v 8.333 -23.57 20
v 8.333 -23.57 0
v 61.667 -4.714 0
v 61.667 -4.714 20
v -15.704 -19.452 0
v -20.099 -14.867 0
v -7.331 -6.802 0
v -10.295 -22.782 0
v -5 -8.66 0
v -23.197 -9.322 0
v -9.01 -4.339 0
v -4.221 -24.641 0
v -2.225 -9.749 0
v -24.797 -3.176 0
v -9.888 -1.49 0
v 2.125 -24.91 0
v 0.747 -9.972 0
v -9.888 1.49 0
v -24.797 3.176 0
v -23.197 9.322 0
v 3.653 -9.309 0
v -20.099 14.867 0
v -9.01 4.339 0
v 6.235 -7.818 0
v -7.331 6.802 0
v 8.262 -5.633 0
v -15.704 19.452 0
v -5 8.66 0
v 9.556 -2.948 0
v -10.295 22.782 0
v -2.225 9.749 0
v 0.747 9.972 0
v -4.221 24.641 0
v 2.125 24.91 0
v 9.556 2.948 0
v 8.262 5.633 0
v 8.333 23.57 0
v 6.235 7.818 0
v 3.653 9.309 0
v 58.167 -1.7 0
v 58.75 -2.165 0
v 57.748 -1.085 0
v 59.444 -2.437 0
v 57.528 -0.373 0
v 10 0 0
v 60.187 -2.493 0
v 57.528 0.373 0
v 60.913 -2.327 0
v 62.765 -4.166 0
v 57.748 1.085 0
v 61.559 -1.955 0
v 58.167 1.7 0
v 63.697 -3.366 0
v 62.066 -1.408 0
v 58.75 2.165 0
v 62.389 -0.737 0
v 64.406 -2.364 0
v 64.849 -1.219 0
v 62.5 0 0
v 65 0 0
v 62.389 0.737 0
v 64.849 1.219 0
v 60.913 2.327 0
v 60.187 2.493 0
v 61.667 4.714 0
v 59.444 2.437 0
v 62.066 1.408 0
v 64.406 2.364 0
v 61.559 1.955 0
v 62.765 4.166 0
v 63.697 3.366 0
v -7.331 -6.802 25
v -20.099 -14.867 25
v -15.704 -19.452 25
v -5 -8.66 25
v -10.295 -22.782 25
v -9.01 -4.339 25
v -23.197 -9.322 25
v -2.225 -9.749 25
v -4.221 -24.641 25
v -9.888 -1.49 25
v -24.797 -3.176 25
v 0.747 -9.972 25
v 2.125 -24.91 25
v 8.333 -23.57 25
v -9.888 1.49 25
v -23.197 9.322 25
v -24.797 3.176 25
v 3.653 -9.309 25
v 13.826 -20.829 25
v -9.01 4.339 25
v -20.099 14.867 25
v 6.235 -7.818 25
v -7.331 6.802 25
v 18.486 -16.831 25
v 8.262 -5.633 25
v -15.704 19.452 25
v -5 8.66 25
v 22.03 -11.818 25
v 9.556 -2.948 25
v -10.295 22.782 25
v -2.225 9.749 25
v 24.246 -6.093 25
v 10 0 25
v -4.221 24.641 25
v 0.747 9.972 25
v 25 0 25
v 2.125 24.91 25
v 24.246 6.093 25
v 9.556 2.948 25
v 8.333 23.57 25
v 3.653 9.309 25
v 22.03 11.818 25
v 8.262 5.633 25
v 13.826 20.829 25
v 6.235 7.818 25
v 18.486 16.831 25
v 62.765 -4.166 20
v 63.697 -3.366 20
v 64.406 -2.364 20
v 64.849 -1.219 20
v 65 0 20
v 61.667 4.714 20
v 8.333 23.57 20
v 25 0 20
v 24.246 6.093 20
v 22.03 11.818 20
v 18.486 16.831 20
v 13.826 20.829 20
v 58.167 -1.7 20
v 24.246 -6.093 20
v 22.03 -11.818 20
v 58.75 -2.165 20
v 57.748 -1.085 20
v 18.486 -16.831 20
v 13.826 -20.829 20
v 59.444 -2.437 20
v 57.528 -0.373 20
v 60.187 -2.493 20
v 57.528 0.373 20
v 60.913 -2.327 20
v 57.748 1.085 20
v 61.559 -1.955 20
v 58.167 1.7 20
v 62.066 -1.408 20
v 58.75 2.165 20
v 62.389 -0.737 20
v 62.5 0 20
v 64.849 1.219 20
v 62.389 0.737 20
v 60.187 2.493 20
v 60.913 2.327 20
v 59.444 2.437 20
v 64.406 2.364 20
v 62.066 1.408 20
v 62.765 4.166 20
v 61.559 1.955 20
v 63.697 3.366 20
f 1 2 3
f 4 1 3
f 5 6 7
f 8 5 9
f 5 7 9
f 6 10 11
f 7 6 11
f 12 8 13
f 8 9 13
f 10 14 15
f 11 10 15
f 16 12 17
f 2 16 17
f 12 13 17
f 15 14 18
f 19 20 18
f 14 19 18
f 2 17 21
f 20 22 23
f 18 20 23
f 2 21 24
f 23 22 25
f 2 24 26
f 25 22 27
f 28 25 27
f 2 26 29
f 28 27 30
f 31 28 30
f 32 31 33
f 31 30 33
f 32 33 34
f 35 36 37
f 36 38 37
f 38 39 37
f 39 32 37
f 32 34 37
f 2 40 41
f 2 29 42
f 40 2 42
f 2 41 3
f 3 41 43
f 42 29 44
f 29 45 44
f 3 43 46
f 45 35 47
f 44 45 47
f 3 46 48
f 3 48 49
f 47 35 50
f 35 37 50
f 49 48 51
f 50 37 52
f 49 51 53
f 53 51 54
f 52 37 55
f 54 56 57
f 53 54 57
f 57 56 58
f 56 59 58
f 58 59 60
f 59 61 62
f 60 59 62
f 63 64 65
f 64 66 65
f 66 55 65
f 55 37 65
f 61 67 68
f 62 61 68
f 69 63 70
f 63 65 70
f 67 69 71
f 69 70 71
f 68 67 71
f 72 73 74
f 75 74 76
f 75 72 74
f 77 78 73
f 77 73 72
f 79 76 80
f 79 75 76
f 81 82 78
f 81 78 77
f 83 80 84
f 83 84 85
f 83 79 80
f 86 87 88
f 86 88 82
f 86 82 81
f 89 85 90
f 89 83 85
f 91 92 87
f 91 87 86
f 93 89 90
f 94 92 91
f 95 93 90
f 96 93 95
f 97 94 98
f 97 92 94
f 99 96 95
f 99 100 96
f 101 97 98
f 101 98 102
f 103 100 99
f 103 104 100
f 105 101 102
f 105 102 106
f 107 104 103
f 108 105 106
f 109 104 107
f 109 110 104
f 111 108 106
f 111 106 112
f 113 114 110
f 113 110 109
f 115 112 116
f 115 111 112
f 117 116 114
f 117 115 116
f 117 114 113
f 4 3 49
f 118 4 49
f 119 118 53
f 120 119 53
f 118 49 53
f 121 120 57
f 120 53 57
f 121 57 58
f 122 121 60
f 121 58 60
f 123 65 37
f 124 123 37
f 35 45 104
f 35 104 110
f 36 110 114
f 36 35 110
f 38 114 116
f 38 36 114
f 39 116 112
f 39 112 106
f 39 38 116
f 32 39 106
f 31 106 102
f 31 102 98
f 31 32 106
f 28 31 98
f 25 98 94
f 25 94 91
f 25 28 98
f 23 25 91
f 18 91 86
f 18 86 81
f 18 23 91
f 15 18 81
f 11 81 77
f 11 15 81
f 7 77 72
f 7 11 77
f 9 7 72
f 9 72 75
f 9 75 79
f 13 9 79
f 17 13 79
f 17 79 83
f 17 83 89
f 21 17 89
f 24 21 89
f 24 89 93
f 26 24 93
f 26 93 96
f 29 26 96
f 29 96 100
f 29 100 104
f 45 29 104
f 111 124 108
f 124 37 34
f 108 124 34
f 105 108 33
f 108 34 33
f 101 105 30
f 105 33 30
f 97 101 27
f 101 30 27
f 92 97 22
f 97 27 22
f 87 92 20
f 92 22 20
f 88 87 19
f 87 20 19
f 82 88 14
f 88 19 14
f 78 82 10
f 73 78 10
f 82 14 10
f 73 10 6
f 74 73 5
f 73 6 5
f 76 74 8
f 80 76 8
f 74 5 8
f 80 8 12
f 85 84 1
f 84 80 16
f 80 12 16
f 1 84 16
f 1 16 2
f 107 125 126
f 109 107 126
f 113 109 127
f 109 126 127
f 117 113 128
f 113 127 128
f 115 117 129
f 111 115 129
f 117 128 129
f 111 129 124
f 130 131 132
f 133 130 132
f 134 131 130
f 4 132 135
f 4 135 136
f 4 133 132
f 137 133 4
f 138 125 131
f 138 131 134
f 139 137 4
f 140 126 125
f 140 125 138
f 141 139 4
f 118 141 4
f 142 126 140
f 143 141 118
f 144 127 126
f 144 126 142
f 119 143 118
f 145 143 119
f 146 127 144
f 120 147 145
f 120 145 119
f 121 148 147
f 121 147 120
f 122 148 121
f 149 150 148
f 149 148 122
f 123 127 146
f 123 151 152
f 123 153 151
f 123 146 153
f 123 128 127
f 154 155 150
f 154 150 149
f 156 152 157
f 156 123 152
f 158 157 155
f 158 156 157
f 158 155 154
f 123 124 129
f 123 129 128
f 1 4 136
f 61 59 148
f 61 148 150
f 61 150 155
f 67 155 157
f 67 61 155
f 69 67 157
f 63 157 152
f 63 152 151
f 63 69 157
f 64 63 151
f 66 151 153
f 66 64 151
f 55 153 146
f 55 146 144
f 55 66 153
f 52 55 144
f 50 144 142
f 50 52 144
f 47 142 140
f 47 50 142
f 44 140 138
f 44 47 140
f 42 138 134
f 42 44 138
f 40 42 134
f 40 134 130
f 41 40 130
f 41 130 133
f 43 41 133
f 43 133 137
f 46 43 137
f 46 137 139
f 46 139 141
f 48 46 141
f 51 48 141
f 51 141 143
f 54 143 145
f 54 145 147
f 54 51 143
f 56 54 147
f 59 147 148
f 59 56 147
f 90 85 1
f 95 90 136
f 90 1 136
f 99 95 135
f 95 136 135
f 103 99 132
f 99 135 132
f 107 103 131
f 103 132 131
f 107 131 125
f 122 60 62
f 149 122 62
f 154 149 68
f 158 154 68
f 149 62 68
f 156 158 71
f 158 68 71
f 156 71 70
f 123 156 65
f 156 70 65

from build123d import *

# Parameters (mm, degrees)
F0_R     = 10
F0_R_2   = 2.5
F1_DEPTH = 20
F2_DEPTH = 25


with BuildPart() as f1:
    # F0 (on Top) → F1 (new body)
    with BuildSketch(Plane.XY):
        with BuildLine():
            ThreePointArc((8.333333, -23.570226), (20.412415, -14.433757), (25, 0))
            ThreePointArc((25, 0), (20.412415, 14.433757), (8.333333, 23.570226))
            ThreePointArc((8.333333, 23.570226), (-25, 0), (8.333333, -23.570226))
        make_face()
        Circle(F0_R, mode=Mode.SUBTRACT)
        with BuildLine():
            ThreePointArc((8.333333, 23.570226), (20.412415, 14.433757), (25, 0))
            ThreePointArc((25, 0), (20.412415, -14.433757), (8.333333, -23.570226))
            Line((8.333333, -23.570226), (61.666667, -4.714045))
            ThreePointArc((61.666667, -4.714045), (55, 0), (61.666667, 4.714045))
            Line((61.666667, 4.714045), (8.333333, 23.570226))
        make_face()
        with BuildLine():
            ThreePointArc((65, 0), (64.082483, 2.886751), (61.666667, 4.714045))
            ThreePointArc((61.666667, 4.714045), (55, 0), (61.666667, -4.714045))
            ThreePointArc((61.666667, -4.714045), (64.082483, -2.886751), (65, 0))
        make_face()
        with Locations((60, 0)):
            Circle(F0_R_2, mode=Mode.SUBTRACT)
    extrude(amount=F1_DEPTH)

    # F0 (on Top) → F2 (join)
    with BuildSketch(Plane.XY):
        with BuildLine():
            ThreePointArc((8.333333, -23.570226), (20.412415, -14.433757), (25, 0))
            ThreePointArc((25, 0), (20.412415, 14.433757), (8.333333, 23.570226))
            ThreePointArc((8.333333, 23.570226), (-25, 0), (8.333333, -23.570226))
        make_face()
        Circle(F0_R, mode=Mode.SUBTRACT)
    extrude(amount=F2_DEPTH)


solid = f1.part
